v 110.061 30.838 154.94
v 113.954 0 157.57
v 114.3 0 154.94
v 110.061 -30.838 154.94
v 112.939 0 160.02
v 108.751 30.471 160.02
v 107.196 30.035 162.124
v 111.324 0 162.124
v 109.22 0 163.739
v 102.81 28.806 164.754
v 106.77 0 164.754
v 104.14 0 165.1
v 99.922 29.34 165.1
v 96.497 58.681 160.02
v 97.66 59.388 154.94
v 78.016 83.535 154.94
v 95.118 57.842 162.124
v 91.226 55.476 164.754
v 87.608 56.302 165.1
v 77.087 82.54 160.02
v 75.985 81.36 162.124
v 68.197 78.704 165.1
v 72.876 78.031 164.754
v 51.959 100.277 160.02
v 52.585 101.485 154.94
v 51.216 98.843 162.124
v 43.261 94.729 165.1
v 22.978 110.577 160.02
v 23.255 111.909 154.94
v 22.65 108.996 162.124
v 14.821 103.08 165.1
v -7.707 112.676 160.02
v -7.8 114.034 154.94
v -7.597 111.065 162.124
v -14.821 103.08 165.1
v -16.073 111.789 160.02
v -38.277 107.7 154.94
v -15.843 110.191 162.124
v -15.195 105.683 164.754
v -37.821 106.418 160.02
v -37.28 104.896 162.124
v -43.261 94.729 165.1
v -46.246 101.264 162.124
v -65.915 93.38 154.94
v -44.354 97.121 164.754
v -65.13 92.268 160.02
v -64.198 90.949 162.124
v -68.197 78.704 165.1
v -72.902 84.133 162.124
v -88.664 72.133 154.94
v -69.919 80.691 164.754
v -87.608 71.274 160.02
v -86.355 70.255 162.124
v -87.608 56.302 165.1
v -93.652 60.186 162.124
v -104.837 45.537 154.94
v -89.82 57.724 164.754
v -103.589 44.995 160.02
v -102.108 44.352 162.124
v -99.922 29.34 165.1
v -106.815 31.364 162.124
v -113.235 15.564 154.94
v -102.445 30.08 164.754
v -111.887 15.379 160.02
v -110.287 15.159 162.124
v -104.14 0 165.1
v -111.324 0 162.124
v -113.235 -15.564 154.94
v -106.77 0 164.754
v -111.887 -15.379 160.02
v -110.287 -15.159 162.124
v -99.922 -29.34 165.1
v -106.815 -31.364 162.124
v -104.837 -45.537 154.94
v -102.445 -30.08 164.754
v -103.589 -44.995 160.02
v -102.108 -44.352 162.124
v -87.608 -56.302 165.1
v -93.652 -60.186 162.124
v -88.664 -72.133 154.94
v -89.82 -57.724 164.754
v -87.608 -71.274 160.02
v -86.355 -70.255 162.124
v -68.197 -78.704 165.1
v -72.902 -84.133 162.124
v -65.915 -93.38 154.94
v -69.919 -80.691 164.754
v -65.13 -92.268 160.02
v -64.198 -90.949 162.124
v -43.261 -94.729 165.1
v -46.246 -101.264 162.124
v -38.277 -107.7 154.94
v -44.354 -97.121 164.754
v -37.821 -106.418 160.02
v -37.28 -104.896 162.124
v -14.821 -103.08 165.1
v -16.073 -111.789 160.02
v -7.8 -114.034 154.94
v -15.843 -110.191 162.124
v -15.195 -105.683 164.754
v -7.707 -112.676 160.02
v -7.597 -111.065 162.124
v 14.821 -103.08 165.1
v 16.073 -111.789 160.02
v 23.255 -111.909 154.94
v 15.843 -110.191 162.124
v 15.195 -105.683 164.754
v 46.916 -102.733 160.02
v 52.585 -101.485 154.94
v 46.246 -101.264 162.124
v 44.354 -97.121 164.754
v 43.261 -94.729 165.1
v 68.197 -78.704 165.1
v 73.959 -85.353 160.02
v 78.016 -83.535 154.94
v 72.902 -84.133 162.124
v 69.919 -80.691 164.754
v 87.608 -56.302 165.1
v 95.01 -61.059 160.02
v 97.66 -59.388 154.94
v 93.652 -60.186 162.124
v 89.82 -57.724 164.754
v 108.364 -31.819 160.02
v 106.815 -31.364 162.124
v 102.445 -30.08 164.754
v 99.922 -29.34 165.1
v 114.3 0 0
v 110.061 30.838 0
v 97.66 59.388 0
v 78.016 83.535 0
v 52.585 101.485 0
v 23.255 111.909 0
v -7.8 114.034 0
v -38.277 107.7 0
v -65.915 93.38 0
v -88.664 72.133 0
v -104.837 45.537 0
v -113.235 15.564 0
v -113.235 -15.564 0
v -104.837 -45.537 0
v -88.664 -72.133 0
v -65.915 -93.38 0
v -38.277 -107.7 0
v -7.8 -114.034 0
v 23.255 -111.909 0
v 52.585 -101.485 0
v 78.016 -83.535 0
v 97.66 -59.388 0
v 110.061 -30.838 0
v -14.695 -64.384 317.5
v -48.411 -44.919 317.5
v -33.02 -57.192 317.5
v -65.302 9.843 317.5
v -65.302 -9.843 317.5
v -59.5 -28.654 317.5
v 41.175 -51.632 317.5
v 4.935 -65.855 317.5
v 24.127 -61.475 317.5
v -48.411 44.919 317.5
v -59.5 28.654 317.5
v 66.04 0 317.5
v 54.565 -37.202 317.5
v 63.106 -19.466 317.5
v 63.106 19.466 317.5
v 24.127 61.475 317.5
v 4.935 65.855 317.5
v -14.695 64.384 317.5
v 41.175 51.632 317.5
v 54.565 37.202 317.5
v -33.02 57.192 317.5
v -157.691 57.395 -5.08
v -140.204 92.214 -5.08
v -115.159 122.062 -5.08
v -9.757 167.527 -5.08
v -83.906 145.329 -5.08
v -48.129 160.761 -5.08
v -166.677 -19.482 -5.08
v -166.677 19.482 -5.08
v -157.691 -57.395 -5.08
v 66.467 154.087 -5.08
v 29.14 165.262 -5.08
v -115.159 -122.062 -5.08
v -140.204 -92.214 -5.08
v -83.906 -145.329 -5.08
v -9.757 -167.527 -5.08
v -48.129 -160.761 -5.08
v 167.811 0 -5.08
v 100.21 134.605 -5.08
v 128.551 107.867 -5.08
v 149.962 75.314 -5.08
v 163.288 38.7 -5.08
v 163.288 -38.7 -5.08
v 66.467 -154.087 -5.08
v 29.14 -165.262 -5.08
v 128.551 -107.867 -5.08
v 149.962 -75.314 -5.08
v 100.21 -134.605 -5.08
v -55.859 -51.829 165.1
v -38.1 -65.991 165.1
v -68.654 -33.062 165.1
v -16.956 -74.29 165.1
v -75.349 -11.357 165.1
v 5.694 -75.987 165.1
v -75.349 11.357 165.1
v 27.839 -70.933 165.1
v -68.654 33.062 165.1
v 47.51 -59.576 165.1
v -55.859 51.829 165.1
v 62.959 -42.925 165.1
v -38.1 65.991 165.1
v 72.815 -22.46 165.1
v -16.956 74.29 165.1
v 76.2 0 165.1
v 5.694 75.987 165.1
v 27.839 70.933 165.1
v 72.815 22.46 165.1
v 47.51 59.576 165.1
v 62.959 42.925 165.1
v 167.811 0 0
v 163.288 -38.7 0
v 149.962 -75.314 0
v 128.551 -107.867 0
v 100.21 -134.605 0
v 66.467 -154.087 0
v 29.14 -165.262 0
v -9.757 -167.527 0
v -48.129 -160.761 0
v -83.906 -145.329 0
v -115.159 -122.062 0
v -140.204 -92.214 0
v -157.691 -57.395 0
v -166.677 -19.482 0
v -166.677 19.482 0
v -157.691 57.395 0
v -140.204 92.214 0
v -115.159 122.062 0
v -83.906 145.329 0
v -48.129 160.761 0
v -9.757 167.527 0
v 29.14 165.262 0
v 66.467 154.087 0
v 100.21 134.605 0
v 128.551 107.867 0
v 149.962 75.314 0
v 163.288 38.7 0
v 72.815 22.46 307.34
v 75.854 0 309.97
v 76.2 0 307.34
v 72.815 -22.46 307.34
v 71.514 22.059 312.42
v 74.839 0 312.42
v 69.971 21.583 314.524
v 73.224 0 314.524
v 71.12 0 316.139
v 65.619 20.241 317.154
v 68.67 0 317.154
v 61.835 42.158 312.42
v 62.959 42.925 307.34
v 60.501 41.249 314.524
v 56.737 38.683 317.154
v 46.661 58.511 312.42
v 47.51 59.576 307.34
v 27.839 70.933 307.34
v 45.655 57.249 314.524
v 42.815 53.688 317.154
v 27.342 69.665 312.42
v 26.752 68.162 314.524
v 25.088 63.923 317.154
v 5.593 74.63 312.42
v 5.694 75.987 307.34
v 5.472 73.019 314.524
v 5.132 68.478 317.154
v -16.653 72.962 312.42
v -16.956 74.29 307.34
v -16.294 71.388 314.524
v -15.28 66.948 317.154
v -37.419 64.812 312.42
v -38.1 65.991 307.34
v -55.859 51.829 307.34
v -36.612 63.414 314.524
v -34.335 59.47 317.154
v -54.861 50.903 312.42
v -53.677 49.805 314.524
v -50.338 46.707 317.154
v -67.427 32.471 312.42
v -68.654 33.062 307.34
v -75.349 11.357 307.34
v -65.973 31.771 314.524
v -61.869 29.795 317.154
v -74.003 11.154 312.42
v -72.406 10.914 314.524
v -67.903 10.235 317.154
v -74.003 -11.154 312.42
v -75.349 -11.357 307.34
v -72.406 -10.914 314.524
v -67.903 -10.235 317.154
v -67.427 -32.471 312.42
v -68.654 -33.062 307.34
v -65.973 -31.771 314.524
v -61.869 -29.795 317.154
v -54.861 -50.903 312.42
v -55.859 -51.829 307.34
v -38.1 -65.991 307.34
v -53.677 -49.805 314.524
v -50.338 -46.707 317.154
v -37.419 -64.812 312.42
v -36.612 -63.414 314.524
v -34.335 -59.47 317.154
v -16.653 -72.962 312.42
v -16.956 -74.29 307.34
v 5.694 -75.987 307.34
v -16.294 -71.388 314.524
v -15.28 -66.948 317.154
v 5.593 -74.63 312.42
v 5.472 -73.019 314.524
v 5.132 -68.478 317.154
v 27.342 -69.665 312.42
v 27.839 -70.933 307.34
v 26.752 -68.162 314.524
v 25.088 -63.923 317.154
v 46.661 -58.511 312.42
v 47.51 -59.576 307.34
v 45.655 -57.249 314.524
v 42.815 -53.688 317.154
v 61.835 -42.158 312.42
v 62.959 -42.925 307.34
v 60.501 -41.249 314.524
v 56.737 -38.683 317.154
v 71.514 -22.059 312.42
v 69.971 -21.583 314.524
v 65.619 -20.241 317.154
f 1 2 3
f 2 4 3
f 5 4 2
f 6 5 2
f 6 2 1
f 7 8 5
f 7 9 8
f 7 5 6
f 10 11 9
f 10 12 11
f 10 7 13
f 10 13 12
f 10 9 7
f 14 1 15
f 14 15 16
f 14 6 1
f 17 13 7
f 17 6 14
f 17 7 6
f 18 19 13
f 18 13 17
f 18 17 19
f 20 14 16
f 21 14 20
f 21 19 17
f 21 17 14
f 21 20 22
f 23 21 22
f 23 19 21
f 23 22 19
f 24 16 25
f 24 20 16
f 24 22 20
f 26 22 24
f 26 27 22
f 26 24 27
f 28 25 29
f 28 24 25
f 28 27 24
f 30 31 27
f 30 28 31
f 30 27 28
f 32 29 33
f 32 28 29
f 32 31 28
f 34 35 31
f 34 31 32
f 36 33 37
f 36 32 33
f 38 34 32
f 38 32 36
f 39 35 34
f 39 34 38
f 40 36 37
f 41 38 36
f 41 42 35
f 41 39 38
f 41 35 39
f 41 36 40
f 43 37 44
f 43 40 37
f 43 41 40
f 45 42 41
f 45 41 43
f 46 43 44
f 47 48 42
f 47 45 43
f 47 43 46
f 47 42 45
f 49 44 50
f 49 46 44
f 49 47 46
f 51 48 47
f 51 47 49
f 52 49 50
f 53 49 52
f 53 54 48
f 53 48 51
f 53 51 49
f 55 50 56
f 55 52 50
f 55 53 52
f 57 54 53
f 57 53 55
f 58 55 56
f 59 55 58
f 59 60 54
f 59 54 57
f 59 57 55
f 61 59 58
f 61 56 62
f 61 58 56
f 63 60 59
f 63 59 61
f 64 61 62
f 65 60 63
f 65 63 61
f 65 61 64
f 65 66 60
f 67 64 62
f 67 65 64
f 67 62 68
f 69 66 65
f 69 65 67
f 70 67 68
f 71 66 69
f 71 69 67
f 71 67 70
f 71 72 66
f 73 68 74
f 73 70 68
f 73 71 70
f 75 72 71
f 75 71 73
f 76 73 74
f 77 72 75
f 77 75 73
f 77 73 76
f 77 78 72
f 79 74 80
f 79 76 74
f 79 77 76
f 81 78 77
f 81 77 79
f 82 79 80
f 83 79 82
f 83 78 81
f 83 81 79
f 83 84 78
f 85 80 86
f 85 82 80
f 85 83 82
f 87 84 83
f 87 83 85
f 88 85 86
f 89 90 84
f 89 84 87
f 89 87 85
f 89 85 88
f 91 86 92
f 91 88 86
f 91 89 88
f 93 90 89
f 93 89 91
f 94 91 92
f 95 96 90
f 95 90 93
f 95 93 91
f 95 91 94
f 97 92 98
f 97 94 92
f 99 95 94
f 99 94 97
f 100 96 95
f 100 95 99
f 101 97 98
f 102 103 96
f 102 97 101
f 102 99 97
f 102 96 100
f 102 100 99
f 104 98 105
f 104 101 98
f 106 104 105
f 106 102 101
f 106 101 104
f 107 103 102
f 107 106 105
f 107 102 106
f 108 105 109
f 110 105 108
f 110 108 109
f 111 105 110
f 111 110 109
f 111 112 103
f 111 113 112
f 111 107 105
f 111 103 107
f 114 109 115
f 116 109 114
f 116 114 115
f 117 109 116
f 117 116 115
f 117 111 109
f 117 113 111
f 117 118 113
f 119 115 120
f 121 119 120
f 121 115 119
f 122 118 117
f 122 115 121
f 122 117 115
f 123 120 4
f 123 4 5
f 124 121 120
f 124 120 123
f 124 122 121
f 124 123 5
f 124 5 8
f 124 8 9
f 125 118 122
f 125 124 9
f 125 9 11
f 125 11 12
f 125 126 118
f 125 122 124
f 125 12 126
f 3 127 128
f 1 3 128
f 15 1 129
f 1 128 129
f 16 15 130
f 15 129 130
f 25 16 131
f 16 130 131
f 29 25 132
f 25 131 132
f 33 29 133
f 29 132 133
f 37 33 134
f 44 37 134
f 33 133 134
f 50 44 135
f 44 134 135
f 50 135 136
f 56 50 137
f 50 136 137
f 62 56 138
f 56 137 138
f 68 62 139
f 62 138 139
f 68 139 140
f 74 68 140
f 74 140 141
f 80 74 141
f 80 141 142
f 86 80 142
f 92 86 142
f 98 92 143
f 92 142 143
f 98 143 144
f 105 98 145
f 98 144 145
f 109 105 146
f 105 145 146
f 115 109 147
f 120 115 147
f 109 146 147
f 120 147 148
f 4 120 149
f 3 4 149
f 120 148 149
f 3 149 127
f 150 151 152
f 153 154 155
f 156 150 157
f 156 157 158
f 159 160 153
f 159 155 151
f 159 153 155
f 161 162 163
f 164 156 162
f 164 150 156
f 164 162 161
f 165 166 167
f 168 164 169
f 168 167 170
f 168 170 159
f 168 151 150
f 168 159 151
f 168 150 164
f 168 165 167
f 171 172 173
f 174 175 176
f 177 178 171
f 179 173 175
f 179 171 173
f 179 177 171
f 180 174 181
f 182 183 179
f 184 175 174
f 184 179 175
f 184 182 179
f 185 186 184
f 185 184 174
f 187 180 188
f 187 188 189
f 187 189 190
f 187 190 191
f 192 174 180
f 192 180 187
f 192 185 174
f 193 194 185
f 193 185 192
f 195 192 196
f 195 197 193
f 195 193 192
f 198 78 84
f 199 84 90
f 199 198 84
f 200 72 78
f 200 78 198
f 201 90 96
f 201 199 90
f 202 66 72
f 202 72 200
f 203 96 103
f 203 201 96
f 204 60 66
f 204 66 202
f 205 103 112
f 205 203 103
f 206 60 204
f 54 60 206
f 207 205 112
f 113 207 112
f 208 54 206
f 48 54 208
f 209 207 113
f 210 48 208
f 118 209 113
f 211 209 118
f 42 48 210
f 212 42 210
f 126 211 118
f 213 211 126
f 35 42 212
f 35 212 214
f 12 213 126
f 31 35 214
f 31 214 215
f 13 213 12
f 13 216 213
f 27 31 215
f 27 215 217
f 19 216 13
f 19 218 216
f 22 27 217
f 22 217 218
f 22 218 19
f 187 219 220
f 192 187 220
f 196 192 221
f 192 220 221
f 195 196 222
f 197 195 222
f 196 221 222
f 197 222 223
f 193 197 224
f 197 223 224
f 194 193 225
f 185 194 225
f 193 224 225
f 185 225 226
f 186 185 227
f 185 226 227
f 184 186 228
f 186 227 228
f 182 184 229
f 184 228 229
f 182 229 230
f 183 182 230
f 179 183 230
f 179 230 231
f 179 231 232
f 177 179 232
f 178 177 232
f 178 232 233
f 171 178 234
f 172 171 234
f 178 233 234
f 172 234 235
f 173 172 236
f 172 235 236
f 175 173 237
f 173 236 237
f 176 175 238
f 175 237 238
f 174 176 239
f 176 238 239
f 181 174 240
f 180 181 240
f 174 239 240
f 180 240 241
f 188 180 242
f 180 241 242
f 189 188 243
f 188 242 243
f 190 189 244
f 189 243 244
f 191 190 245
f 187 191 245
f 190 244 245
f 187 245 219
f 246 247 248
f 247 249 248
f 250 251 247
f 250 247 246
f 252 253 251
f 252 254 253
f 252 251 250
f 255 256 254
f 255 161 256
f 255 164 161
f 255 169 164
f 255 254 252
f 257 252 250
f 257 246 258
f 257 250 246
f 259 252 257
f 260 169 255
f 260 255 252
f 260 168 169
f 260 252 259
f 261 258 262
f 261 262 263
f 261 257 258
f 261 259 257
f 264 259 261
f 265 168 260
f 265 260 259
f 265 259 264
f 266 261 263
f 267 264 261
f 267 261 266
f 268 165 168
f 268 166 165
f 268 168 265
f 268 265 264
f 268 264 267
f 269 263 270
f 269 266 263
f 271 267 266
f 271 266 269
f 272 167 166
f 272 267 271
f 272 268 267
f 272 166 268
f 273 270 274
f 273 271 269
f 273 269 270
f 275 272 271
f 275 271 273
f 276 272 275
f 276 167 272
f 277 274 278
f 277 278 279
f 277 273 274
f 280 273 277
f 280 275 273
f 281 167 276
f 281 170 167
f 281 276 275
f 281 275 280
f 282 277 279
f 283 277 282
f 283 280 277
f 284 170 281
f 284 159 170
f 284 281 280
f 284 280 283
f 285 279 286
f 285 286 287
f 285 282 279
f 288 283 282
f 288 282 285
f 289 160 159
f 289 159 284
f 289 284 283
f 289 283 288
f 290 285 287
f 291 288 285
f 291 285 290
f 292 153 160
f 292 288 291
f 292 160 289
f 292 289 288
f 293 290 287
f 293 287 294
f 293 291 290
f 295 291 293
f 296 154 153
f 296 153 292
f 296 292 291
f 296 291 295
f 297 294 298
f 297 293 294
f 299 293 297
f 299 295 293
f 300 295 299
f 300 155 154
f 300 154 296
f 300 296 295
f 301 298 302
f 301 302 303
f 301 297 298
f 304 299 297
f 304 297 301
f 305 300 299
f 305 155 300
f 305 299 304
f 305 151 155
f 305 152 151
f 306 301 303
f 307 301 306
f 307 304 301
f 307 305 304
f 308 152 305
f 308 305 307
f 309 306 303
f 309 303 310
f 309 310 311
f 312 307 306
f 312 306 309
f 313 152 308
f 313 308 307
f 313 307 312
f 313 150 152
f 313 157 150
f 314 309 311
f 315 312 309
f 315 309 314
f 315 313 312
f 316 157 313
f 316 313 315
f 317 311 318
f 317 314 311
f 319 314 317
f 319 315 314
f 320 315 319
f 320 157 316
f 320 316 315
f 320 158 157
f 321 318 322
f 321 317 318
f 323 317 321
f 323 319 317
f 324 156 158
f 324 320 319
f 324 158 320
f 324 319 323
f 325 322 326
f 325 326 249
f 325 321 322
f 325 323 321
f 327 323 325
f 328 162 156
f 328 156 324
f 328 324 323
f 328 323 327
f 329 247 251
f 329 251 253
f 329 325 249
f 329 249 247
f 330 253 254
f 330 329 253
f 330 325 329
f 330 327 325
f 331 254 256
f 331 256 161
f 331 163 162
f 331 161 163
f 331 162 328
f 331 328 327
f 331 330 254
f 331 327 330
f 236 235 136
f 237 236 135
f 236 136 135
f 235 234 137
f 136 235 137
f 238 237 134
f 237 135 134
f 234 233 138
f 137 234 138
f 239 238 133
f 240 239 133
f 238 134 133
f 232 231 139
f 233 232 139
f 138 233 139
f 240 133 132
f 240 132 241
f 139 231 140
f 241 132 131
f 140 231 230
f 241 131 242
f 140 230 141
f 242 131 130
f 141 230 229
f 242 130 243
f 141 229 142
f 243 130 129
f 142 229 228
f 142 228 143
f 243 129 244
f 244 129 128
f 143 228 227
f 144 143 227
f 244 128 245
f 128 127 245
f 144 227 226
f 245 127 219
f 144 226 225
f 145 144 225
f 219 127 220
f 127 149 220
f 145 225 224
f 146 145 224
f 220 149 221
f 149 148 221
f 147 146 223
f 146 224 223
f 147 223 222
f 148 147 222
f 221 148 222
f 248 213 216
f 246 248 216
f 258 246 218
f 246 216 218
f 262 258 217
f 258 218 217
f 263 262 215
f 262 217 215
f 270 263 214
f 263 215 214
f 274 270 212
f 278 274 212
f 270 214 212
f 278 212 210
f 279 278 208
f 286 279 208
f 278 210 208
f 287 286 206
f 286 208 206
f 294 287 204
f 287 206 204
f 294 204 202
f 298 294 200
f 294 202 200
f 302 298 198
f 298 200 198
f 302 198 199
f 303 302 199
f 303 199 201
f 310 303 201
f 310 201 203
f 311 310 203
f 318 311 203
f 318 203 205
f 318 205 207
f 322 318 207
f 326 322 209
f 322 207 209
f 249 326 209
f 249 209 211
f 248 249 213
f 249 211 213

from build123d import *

# Parameters (mm, degrees)
F0_R     = 114.3
F1_DEPTH = 165.1
F2_R     = 76.2
F3_DEPTH = 152.4
F4_R     = 10.16
F5_R     = 167.81132
F6_DEPTH = 5.08


with BuildPart() as f1:
    # F0 (on Top) → F1 (new body)
    with BuildSketch(Plane.XY):
        Circle(F0_R)
    extrude(amount=F1_DEPTH)

    # F2 (on face) → F3 (join)
    with BuildSketch(Plane.XY.offset(165.1)):
        Circle(F2_R)
    extrude(amount=F3_DEPTH)

    # F4
    f4_edges = [f1.edges().sort_by_distance(p)[0] for p in [
        (-114.3, 0, 165.1),
        (-76.2, 0, 317.5),
    ]]
    fillet(f4_edges, radius=F4_R)

    # F5 (on face) → F6 (join)
    with BuildSketch(Plane(origin=(0, 0, 0), x_dir=(1, 0, 0), z_dir=(0, 0, -1))):
        Circle(F5_R)
    extrude(amount=F6_DEPTH)


solid = f1.part
